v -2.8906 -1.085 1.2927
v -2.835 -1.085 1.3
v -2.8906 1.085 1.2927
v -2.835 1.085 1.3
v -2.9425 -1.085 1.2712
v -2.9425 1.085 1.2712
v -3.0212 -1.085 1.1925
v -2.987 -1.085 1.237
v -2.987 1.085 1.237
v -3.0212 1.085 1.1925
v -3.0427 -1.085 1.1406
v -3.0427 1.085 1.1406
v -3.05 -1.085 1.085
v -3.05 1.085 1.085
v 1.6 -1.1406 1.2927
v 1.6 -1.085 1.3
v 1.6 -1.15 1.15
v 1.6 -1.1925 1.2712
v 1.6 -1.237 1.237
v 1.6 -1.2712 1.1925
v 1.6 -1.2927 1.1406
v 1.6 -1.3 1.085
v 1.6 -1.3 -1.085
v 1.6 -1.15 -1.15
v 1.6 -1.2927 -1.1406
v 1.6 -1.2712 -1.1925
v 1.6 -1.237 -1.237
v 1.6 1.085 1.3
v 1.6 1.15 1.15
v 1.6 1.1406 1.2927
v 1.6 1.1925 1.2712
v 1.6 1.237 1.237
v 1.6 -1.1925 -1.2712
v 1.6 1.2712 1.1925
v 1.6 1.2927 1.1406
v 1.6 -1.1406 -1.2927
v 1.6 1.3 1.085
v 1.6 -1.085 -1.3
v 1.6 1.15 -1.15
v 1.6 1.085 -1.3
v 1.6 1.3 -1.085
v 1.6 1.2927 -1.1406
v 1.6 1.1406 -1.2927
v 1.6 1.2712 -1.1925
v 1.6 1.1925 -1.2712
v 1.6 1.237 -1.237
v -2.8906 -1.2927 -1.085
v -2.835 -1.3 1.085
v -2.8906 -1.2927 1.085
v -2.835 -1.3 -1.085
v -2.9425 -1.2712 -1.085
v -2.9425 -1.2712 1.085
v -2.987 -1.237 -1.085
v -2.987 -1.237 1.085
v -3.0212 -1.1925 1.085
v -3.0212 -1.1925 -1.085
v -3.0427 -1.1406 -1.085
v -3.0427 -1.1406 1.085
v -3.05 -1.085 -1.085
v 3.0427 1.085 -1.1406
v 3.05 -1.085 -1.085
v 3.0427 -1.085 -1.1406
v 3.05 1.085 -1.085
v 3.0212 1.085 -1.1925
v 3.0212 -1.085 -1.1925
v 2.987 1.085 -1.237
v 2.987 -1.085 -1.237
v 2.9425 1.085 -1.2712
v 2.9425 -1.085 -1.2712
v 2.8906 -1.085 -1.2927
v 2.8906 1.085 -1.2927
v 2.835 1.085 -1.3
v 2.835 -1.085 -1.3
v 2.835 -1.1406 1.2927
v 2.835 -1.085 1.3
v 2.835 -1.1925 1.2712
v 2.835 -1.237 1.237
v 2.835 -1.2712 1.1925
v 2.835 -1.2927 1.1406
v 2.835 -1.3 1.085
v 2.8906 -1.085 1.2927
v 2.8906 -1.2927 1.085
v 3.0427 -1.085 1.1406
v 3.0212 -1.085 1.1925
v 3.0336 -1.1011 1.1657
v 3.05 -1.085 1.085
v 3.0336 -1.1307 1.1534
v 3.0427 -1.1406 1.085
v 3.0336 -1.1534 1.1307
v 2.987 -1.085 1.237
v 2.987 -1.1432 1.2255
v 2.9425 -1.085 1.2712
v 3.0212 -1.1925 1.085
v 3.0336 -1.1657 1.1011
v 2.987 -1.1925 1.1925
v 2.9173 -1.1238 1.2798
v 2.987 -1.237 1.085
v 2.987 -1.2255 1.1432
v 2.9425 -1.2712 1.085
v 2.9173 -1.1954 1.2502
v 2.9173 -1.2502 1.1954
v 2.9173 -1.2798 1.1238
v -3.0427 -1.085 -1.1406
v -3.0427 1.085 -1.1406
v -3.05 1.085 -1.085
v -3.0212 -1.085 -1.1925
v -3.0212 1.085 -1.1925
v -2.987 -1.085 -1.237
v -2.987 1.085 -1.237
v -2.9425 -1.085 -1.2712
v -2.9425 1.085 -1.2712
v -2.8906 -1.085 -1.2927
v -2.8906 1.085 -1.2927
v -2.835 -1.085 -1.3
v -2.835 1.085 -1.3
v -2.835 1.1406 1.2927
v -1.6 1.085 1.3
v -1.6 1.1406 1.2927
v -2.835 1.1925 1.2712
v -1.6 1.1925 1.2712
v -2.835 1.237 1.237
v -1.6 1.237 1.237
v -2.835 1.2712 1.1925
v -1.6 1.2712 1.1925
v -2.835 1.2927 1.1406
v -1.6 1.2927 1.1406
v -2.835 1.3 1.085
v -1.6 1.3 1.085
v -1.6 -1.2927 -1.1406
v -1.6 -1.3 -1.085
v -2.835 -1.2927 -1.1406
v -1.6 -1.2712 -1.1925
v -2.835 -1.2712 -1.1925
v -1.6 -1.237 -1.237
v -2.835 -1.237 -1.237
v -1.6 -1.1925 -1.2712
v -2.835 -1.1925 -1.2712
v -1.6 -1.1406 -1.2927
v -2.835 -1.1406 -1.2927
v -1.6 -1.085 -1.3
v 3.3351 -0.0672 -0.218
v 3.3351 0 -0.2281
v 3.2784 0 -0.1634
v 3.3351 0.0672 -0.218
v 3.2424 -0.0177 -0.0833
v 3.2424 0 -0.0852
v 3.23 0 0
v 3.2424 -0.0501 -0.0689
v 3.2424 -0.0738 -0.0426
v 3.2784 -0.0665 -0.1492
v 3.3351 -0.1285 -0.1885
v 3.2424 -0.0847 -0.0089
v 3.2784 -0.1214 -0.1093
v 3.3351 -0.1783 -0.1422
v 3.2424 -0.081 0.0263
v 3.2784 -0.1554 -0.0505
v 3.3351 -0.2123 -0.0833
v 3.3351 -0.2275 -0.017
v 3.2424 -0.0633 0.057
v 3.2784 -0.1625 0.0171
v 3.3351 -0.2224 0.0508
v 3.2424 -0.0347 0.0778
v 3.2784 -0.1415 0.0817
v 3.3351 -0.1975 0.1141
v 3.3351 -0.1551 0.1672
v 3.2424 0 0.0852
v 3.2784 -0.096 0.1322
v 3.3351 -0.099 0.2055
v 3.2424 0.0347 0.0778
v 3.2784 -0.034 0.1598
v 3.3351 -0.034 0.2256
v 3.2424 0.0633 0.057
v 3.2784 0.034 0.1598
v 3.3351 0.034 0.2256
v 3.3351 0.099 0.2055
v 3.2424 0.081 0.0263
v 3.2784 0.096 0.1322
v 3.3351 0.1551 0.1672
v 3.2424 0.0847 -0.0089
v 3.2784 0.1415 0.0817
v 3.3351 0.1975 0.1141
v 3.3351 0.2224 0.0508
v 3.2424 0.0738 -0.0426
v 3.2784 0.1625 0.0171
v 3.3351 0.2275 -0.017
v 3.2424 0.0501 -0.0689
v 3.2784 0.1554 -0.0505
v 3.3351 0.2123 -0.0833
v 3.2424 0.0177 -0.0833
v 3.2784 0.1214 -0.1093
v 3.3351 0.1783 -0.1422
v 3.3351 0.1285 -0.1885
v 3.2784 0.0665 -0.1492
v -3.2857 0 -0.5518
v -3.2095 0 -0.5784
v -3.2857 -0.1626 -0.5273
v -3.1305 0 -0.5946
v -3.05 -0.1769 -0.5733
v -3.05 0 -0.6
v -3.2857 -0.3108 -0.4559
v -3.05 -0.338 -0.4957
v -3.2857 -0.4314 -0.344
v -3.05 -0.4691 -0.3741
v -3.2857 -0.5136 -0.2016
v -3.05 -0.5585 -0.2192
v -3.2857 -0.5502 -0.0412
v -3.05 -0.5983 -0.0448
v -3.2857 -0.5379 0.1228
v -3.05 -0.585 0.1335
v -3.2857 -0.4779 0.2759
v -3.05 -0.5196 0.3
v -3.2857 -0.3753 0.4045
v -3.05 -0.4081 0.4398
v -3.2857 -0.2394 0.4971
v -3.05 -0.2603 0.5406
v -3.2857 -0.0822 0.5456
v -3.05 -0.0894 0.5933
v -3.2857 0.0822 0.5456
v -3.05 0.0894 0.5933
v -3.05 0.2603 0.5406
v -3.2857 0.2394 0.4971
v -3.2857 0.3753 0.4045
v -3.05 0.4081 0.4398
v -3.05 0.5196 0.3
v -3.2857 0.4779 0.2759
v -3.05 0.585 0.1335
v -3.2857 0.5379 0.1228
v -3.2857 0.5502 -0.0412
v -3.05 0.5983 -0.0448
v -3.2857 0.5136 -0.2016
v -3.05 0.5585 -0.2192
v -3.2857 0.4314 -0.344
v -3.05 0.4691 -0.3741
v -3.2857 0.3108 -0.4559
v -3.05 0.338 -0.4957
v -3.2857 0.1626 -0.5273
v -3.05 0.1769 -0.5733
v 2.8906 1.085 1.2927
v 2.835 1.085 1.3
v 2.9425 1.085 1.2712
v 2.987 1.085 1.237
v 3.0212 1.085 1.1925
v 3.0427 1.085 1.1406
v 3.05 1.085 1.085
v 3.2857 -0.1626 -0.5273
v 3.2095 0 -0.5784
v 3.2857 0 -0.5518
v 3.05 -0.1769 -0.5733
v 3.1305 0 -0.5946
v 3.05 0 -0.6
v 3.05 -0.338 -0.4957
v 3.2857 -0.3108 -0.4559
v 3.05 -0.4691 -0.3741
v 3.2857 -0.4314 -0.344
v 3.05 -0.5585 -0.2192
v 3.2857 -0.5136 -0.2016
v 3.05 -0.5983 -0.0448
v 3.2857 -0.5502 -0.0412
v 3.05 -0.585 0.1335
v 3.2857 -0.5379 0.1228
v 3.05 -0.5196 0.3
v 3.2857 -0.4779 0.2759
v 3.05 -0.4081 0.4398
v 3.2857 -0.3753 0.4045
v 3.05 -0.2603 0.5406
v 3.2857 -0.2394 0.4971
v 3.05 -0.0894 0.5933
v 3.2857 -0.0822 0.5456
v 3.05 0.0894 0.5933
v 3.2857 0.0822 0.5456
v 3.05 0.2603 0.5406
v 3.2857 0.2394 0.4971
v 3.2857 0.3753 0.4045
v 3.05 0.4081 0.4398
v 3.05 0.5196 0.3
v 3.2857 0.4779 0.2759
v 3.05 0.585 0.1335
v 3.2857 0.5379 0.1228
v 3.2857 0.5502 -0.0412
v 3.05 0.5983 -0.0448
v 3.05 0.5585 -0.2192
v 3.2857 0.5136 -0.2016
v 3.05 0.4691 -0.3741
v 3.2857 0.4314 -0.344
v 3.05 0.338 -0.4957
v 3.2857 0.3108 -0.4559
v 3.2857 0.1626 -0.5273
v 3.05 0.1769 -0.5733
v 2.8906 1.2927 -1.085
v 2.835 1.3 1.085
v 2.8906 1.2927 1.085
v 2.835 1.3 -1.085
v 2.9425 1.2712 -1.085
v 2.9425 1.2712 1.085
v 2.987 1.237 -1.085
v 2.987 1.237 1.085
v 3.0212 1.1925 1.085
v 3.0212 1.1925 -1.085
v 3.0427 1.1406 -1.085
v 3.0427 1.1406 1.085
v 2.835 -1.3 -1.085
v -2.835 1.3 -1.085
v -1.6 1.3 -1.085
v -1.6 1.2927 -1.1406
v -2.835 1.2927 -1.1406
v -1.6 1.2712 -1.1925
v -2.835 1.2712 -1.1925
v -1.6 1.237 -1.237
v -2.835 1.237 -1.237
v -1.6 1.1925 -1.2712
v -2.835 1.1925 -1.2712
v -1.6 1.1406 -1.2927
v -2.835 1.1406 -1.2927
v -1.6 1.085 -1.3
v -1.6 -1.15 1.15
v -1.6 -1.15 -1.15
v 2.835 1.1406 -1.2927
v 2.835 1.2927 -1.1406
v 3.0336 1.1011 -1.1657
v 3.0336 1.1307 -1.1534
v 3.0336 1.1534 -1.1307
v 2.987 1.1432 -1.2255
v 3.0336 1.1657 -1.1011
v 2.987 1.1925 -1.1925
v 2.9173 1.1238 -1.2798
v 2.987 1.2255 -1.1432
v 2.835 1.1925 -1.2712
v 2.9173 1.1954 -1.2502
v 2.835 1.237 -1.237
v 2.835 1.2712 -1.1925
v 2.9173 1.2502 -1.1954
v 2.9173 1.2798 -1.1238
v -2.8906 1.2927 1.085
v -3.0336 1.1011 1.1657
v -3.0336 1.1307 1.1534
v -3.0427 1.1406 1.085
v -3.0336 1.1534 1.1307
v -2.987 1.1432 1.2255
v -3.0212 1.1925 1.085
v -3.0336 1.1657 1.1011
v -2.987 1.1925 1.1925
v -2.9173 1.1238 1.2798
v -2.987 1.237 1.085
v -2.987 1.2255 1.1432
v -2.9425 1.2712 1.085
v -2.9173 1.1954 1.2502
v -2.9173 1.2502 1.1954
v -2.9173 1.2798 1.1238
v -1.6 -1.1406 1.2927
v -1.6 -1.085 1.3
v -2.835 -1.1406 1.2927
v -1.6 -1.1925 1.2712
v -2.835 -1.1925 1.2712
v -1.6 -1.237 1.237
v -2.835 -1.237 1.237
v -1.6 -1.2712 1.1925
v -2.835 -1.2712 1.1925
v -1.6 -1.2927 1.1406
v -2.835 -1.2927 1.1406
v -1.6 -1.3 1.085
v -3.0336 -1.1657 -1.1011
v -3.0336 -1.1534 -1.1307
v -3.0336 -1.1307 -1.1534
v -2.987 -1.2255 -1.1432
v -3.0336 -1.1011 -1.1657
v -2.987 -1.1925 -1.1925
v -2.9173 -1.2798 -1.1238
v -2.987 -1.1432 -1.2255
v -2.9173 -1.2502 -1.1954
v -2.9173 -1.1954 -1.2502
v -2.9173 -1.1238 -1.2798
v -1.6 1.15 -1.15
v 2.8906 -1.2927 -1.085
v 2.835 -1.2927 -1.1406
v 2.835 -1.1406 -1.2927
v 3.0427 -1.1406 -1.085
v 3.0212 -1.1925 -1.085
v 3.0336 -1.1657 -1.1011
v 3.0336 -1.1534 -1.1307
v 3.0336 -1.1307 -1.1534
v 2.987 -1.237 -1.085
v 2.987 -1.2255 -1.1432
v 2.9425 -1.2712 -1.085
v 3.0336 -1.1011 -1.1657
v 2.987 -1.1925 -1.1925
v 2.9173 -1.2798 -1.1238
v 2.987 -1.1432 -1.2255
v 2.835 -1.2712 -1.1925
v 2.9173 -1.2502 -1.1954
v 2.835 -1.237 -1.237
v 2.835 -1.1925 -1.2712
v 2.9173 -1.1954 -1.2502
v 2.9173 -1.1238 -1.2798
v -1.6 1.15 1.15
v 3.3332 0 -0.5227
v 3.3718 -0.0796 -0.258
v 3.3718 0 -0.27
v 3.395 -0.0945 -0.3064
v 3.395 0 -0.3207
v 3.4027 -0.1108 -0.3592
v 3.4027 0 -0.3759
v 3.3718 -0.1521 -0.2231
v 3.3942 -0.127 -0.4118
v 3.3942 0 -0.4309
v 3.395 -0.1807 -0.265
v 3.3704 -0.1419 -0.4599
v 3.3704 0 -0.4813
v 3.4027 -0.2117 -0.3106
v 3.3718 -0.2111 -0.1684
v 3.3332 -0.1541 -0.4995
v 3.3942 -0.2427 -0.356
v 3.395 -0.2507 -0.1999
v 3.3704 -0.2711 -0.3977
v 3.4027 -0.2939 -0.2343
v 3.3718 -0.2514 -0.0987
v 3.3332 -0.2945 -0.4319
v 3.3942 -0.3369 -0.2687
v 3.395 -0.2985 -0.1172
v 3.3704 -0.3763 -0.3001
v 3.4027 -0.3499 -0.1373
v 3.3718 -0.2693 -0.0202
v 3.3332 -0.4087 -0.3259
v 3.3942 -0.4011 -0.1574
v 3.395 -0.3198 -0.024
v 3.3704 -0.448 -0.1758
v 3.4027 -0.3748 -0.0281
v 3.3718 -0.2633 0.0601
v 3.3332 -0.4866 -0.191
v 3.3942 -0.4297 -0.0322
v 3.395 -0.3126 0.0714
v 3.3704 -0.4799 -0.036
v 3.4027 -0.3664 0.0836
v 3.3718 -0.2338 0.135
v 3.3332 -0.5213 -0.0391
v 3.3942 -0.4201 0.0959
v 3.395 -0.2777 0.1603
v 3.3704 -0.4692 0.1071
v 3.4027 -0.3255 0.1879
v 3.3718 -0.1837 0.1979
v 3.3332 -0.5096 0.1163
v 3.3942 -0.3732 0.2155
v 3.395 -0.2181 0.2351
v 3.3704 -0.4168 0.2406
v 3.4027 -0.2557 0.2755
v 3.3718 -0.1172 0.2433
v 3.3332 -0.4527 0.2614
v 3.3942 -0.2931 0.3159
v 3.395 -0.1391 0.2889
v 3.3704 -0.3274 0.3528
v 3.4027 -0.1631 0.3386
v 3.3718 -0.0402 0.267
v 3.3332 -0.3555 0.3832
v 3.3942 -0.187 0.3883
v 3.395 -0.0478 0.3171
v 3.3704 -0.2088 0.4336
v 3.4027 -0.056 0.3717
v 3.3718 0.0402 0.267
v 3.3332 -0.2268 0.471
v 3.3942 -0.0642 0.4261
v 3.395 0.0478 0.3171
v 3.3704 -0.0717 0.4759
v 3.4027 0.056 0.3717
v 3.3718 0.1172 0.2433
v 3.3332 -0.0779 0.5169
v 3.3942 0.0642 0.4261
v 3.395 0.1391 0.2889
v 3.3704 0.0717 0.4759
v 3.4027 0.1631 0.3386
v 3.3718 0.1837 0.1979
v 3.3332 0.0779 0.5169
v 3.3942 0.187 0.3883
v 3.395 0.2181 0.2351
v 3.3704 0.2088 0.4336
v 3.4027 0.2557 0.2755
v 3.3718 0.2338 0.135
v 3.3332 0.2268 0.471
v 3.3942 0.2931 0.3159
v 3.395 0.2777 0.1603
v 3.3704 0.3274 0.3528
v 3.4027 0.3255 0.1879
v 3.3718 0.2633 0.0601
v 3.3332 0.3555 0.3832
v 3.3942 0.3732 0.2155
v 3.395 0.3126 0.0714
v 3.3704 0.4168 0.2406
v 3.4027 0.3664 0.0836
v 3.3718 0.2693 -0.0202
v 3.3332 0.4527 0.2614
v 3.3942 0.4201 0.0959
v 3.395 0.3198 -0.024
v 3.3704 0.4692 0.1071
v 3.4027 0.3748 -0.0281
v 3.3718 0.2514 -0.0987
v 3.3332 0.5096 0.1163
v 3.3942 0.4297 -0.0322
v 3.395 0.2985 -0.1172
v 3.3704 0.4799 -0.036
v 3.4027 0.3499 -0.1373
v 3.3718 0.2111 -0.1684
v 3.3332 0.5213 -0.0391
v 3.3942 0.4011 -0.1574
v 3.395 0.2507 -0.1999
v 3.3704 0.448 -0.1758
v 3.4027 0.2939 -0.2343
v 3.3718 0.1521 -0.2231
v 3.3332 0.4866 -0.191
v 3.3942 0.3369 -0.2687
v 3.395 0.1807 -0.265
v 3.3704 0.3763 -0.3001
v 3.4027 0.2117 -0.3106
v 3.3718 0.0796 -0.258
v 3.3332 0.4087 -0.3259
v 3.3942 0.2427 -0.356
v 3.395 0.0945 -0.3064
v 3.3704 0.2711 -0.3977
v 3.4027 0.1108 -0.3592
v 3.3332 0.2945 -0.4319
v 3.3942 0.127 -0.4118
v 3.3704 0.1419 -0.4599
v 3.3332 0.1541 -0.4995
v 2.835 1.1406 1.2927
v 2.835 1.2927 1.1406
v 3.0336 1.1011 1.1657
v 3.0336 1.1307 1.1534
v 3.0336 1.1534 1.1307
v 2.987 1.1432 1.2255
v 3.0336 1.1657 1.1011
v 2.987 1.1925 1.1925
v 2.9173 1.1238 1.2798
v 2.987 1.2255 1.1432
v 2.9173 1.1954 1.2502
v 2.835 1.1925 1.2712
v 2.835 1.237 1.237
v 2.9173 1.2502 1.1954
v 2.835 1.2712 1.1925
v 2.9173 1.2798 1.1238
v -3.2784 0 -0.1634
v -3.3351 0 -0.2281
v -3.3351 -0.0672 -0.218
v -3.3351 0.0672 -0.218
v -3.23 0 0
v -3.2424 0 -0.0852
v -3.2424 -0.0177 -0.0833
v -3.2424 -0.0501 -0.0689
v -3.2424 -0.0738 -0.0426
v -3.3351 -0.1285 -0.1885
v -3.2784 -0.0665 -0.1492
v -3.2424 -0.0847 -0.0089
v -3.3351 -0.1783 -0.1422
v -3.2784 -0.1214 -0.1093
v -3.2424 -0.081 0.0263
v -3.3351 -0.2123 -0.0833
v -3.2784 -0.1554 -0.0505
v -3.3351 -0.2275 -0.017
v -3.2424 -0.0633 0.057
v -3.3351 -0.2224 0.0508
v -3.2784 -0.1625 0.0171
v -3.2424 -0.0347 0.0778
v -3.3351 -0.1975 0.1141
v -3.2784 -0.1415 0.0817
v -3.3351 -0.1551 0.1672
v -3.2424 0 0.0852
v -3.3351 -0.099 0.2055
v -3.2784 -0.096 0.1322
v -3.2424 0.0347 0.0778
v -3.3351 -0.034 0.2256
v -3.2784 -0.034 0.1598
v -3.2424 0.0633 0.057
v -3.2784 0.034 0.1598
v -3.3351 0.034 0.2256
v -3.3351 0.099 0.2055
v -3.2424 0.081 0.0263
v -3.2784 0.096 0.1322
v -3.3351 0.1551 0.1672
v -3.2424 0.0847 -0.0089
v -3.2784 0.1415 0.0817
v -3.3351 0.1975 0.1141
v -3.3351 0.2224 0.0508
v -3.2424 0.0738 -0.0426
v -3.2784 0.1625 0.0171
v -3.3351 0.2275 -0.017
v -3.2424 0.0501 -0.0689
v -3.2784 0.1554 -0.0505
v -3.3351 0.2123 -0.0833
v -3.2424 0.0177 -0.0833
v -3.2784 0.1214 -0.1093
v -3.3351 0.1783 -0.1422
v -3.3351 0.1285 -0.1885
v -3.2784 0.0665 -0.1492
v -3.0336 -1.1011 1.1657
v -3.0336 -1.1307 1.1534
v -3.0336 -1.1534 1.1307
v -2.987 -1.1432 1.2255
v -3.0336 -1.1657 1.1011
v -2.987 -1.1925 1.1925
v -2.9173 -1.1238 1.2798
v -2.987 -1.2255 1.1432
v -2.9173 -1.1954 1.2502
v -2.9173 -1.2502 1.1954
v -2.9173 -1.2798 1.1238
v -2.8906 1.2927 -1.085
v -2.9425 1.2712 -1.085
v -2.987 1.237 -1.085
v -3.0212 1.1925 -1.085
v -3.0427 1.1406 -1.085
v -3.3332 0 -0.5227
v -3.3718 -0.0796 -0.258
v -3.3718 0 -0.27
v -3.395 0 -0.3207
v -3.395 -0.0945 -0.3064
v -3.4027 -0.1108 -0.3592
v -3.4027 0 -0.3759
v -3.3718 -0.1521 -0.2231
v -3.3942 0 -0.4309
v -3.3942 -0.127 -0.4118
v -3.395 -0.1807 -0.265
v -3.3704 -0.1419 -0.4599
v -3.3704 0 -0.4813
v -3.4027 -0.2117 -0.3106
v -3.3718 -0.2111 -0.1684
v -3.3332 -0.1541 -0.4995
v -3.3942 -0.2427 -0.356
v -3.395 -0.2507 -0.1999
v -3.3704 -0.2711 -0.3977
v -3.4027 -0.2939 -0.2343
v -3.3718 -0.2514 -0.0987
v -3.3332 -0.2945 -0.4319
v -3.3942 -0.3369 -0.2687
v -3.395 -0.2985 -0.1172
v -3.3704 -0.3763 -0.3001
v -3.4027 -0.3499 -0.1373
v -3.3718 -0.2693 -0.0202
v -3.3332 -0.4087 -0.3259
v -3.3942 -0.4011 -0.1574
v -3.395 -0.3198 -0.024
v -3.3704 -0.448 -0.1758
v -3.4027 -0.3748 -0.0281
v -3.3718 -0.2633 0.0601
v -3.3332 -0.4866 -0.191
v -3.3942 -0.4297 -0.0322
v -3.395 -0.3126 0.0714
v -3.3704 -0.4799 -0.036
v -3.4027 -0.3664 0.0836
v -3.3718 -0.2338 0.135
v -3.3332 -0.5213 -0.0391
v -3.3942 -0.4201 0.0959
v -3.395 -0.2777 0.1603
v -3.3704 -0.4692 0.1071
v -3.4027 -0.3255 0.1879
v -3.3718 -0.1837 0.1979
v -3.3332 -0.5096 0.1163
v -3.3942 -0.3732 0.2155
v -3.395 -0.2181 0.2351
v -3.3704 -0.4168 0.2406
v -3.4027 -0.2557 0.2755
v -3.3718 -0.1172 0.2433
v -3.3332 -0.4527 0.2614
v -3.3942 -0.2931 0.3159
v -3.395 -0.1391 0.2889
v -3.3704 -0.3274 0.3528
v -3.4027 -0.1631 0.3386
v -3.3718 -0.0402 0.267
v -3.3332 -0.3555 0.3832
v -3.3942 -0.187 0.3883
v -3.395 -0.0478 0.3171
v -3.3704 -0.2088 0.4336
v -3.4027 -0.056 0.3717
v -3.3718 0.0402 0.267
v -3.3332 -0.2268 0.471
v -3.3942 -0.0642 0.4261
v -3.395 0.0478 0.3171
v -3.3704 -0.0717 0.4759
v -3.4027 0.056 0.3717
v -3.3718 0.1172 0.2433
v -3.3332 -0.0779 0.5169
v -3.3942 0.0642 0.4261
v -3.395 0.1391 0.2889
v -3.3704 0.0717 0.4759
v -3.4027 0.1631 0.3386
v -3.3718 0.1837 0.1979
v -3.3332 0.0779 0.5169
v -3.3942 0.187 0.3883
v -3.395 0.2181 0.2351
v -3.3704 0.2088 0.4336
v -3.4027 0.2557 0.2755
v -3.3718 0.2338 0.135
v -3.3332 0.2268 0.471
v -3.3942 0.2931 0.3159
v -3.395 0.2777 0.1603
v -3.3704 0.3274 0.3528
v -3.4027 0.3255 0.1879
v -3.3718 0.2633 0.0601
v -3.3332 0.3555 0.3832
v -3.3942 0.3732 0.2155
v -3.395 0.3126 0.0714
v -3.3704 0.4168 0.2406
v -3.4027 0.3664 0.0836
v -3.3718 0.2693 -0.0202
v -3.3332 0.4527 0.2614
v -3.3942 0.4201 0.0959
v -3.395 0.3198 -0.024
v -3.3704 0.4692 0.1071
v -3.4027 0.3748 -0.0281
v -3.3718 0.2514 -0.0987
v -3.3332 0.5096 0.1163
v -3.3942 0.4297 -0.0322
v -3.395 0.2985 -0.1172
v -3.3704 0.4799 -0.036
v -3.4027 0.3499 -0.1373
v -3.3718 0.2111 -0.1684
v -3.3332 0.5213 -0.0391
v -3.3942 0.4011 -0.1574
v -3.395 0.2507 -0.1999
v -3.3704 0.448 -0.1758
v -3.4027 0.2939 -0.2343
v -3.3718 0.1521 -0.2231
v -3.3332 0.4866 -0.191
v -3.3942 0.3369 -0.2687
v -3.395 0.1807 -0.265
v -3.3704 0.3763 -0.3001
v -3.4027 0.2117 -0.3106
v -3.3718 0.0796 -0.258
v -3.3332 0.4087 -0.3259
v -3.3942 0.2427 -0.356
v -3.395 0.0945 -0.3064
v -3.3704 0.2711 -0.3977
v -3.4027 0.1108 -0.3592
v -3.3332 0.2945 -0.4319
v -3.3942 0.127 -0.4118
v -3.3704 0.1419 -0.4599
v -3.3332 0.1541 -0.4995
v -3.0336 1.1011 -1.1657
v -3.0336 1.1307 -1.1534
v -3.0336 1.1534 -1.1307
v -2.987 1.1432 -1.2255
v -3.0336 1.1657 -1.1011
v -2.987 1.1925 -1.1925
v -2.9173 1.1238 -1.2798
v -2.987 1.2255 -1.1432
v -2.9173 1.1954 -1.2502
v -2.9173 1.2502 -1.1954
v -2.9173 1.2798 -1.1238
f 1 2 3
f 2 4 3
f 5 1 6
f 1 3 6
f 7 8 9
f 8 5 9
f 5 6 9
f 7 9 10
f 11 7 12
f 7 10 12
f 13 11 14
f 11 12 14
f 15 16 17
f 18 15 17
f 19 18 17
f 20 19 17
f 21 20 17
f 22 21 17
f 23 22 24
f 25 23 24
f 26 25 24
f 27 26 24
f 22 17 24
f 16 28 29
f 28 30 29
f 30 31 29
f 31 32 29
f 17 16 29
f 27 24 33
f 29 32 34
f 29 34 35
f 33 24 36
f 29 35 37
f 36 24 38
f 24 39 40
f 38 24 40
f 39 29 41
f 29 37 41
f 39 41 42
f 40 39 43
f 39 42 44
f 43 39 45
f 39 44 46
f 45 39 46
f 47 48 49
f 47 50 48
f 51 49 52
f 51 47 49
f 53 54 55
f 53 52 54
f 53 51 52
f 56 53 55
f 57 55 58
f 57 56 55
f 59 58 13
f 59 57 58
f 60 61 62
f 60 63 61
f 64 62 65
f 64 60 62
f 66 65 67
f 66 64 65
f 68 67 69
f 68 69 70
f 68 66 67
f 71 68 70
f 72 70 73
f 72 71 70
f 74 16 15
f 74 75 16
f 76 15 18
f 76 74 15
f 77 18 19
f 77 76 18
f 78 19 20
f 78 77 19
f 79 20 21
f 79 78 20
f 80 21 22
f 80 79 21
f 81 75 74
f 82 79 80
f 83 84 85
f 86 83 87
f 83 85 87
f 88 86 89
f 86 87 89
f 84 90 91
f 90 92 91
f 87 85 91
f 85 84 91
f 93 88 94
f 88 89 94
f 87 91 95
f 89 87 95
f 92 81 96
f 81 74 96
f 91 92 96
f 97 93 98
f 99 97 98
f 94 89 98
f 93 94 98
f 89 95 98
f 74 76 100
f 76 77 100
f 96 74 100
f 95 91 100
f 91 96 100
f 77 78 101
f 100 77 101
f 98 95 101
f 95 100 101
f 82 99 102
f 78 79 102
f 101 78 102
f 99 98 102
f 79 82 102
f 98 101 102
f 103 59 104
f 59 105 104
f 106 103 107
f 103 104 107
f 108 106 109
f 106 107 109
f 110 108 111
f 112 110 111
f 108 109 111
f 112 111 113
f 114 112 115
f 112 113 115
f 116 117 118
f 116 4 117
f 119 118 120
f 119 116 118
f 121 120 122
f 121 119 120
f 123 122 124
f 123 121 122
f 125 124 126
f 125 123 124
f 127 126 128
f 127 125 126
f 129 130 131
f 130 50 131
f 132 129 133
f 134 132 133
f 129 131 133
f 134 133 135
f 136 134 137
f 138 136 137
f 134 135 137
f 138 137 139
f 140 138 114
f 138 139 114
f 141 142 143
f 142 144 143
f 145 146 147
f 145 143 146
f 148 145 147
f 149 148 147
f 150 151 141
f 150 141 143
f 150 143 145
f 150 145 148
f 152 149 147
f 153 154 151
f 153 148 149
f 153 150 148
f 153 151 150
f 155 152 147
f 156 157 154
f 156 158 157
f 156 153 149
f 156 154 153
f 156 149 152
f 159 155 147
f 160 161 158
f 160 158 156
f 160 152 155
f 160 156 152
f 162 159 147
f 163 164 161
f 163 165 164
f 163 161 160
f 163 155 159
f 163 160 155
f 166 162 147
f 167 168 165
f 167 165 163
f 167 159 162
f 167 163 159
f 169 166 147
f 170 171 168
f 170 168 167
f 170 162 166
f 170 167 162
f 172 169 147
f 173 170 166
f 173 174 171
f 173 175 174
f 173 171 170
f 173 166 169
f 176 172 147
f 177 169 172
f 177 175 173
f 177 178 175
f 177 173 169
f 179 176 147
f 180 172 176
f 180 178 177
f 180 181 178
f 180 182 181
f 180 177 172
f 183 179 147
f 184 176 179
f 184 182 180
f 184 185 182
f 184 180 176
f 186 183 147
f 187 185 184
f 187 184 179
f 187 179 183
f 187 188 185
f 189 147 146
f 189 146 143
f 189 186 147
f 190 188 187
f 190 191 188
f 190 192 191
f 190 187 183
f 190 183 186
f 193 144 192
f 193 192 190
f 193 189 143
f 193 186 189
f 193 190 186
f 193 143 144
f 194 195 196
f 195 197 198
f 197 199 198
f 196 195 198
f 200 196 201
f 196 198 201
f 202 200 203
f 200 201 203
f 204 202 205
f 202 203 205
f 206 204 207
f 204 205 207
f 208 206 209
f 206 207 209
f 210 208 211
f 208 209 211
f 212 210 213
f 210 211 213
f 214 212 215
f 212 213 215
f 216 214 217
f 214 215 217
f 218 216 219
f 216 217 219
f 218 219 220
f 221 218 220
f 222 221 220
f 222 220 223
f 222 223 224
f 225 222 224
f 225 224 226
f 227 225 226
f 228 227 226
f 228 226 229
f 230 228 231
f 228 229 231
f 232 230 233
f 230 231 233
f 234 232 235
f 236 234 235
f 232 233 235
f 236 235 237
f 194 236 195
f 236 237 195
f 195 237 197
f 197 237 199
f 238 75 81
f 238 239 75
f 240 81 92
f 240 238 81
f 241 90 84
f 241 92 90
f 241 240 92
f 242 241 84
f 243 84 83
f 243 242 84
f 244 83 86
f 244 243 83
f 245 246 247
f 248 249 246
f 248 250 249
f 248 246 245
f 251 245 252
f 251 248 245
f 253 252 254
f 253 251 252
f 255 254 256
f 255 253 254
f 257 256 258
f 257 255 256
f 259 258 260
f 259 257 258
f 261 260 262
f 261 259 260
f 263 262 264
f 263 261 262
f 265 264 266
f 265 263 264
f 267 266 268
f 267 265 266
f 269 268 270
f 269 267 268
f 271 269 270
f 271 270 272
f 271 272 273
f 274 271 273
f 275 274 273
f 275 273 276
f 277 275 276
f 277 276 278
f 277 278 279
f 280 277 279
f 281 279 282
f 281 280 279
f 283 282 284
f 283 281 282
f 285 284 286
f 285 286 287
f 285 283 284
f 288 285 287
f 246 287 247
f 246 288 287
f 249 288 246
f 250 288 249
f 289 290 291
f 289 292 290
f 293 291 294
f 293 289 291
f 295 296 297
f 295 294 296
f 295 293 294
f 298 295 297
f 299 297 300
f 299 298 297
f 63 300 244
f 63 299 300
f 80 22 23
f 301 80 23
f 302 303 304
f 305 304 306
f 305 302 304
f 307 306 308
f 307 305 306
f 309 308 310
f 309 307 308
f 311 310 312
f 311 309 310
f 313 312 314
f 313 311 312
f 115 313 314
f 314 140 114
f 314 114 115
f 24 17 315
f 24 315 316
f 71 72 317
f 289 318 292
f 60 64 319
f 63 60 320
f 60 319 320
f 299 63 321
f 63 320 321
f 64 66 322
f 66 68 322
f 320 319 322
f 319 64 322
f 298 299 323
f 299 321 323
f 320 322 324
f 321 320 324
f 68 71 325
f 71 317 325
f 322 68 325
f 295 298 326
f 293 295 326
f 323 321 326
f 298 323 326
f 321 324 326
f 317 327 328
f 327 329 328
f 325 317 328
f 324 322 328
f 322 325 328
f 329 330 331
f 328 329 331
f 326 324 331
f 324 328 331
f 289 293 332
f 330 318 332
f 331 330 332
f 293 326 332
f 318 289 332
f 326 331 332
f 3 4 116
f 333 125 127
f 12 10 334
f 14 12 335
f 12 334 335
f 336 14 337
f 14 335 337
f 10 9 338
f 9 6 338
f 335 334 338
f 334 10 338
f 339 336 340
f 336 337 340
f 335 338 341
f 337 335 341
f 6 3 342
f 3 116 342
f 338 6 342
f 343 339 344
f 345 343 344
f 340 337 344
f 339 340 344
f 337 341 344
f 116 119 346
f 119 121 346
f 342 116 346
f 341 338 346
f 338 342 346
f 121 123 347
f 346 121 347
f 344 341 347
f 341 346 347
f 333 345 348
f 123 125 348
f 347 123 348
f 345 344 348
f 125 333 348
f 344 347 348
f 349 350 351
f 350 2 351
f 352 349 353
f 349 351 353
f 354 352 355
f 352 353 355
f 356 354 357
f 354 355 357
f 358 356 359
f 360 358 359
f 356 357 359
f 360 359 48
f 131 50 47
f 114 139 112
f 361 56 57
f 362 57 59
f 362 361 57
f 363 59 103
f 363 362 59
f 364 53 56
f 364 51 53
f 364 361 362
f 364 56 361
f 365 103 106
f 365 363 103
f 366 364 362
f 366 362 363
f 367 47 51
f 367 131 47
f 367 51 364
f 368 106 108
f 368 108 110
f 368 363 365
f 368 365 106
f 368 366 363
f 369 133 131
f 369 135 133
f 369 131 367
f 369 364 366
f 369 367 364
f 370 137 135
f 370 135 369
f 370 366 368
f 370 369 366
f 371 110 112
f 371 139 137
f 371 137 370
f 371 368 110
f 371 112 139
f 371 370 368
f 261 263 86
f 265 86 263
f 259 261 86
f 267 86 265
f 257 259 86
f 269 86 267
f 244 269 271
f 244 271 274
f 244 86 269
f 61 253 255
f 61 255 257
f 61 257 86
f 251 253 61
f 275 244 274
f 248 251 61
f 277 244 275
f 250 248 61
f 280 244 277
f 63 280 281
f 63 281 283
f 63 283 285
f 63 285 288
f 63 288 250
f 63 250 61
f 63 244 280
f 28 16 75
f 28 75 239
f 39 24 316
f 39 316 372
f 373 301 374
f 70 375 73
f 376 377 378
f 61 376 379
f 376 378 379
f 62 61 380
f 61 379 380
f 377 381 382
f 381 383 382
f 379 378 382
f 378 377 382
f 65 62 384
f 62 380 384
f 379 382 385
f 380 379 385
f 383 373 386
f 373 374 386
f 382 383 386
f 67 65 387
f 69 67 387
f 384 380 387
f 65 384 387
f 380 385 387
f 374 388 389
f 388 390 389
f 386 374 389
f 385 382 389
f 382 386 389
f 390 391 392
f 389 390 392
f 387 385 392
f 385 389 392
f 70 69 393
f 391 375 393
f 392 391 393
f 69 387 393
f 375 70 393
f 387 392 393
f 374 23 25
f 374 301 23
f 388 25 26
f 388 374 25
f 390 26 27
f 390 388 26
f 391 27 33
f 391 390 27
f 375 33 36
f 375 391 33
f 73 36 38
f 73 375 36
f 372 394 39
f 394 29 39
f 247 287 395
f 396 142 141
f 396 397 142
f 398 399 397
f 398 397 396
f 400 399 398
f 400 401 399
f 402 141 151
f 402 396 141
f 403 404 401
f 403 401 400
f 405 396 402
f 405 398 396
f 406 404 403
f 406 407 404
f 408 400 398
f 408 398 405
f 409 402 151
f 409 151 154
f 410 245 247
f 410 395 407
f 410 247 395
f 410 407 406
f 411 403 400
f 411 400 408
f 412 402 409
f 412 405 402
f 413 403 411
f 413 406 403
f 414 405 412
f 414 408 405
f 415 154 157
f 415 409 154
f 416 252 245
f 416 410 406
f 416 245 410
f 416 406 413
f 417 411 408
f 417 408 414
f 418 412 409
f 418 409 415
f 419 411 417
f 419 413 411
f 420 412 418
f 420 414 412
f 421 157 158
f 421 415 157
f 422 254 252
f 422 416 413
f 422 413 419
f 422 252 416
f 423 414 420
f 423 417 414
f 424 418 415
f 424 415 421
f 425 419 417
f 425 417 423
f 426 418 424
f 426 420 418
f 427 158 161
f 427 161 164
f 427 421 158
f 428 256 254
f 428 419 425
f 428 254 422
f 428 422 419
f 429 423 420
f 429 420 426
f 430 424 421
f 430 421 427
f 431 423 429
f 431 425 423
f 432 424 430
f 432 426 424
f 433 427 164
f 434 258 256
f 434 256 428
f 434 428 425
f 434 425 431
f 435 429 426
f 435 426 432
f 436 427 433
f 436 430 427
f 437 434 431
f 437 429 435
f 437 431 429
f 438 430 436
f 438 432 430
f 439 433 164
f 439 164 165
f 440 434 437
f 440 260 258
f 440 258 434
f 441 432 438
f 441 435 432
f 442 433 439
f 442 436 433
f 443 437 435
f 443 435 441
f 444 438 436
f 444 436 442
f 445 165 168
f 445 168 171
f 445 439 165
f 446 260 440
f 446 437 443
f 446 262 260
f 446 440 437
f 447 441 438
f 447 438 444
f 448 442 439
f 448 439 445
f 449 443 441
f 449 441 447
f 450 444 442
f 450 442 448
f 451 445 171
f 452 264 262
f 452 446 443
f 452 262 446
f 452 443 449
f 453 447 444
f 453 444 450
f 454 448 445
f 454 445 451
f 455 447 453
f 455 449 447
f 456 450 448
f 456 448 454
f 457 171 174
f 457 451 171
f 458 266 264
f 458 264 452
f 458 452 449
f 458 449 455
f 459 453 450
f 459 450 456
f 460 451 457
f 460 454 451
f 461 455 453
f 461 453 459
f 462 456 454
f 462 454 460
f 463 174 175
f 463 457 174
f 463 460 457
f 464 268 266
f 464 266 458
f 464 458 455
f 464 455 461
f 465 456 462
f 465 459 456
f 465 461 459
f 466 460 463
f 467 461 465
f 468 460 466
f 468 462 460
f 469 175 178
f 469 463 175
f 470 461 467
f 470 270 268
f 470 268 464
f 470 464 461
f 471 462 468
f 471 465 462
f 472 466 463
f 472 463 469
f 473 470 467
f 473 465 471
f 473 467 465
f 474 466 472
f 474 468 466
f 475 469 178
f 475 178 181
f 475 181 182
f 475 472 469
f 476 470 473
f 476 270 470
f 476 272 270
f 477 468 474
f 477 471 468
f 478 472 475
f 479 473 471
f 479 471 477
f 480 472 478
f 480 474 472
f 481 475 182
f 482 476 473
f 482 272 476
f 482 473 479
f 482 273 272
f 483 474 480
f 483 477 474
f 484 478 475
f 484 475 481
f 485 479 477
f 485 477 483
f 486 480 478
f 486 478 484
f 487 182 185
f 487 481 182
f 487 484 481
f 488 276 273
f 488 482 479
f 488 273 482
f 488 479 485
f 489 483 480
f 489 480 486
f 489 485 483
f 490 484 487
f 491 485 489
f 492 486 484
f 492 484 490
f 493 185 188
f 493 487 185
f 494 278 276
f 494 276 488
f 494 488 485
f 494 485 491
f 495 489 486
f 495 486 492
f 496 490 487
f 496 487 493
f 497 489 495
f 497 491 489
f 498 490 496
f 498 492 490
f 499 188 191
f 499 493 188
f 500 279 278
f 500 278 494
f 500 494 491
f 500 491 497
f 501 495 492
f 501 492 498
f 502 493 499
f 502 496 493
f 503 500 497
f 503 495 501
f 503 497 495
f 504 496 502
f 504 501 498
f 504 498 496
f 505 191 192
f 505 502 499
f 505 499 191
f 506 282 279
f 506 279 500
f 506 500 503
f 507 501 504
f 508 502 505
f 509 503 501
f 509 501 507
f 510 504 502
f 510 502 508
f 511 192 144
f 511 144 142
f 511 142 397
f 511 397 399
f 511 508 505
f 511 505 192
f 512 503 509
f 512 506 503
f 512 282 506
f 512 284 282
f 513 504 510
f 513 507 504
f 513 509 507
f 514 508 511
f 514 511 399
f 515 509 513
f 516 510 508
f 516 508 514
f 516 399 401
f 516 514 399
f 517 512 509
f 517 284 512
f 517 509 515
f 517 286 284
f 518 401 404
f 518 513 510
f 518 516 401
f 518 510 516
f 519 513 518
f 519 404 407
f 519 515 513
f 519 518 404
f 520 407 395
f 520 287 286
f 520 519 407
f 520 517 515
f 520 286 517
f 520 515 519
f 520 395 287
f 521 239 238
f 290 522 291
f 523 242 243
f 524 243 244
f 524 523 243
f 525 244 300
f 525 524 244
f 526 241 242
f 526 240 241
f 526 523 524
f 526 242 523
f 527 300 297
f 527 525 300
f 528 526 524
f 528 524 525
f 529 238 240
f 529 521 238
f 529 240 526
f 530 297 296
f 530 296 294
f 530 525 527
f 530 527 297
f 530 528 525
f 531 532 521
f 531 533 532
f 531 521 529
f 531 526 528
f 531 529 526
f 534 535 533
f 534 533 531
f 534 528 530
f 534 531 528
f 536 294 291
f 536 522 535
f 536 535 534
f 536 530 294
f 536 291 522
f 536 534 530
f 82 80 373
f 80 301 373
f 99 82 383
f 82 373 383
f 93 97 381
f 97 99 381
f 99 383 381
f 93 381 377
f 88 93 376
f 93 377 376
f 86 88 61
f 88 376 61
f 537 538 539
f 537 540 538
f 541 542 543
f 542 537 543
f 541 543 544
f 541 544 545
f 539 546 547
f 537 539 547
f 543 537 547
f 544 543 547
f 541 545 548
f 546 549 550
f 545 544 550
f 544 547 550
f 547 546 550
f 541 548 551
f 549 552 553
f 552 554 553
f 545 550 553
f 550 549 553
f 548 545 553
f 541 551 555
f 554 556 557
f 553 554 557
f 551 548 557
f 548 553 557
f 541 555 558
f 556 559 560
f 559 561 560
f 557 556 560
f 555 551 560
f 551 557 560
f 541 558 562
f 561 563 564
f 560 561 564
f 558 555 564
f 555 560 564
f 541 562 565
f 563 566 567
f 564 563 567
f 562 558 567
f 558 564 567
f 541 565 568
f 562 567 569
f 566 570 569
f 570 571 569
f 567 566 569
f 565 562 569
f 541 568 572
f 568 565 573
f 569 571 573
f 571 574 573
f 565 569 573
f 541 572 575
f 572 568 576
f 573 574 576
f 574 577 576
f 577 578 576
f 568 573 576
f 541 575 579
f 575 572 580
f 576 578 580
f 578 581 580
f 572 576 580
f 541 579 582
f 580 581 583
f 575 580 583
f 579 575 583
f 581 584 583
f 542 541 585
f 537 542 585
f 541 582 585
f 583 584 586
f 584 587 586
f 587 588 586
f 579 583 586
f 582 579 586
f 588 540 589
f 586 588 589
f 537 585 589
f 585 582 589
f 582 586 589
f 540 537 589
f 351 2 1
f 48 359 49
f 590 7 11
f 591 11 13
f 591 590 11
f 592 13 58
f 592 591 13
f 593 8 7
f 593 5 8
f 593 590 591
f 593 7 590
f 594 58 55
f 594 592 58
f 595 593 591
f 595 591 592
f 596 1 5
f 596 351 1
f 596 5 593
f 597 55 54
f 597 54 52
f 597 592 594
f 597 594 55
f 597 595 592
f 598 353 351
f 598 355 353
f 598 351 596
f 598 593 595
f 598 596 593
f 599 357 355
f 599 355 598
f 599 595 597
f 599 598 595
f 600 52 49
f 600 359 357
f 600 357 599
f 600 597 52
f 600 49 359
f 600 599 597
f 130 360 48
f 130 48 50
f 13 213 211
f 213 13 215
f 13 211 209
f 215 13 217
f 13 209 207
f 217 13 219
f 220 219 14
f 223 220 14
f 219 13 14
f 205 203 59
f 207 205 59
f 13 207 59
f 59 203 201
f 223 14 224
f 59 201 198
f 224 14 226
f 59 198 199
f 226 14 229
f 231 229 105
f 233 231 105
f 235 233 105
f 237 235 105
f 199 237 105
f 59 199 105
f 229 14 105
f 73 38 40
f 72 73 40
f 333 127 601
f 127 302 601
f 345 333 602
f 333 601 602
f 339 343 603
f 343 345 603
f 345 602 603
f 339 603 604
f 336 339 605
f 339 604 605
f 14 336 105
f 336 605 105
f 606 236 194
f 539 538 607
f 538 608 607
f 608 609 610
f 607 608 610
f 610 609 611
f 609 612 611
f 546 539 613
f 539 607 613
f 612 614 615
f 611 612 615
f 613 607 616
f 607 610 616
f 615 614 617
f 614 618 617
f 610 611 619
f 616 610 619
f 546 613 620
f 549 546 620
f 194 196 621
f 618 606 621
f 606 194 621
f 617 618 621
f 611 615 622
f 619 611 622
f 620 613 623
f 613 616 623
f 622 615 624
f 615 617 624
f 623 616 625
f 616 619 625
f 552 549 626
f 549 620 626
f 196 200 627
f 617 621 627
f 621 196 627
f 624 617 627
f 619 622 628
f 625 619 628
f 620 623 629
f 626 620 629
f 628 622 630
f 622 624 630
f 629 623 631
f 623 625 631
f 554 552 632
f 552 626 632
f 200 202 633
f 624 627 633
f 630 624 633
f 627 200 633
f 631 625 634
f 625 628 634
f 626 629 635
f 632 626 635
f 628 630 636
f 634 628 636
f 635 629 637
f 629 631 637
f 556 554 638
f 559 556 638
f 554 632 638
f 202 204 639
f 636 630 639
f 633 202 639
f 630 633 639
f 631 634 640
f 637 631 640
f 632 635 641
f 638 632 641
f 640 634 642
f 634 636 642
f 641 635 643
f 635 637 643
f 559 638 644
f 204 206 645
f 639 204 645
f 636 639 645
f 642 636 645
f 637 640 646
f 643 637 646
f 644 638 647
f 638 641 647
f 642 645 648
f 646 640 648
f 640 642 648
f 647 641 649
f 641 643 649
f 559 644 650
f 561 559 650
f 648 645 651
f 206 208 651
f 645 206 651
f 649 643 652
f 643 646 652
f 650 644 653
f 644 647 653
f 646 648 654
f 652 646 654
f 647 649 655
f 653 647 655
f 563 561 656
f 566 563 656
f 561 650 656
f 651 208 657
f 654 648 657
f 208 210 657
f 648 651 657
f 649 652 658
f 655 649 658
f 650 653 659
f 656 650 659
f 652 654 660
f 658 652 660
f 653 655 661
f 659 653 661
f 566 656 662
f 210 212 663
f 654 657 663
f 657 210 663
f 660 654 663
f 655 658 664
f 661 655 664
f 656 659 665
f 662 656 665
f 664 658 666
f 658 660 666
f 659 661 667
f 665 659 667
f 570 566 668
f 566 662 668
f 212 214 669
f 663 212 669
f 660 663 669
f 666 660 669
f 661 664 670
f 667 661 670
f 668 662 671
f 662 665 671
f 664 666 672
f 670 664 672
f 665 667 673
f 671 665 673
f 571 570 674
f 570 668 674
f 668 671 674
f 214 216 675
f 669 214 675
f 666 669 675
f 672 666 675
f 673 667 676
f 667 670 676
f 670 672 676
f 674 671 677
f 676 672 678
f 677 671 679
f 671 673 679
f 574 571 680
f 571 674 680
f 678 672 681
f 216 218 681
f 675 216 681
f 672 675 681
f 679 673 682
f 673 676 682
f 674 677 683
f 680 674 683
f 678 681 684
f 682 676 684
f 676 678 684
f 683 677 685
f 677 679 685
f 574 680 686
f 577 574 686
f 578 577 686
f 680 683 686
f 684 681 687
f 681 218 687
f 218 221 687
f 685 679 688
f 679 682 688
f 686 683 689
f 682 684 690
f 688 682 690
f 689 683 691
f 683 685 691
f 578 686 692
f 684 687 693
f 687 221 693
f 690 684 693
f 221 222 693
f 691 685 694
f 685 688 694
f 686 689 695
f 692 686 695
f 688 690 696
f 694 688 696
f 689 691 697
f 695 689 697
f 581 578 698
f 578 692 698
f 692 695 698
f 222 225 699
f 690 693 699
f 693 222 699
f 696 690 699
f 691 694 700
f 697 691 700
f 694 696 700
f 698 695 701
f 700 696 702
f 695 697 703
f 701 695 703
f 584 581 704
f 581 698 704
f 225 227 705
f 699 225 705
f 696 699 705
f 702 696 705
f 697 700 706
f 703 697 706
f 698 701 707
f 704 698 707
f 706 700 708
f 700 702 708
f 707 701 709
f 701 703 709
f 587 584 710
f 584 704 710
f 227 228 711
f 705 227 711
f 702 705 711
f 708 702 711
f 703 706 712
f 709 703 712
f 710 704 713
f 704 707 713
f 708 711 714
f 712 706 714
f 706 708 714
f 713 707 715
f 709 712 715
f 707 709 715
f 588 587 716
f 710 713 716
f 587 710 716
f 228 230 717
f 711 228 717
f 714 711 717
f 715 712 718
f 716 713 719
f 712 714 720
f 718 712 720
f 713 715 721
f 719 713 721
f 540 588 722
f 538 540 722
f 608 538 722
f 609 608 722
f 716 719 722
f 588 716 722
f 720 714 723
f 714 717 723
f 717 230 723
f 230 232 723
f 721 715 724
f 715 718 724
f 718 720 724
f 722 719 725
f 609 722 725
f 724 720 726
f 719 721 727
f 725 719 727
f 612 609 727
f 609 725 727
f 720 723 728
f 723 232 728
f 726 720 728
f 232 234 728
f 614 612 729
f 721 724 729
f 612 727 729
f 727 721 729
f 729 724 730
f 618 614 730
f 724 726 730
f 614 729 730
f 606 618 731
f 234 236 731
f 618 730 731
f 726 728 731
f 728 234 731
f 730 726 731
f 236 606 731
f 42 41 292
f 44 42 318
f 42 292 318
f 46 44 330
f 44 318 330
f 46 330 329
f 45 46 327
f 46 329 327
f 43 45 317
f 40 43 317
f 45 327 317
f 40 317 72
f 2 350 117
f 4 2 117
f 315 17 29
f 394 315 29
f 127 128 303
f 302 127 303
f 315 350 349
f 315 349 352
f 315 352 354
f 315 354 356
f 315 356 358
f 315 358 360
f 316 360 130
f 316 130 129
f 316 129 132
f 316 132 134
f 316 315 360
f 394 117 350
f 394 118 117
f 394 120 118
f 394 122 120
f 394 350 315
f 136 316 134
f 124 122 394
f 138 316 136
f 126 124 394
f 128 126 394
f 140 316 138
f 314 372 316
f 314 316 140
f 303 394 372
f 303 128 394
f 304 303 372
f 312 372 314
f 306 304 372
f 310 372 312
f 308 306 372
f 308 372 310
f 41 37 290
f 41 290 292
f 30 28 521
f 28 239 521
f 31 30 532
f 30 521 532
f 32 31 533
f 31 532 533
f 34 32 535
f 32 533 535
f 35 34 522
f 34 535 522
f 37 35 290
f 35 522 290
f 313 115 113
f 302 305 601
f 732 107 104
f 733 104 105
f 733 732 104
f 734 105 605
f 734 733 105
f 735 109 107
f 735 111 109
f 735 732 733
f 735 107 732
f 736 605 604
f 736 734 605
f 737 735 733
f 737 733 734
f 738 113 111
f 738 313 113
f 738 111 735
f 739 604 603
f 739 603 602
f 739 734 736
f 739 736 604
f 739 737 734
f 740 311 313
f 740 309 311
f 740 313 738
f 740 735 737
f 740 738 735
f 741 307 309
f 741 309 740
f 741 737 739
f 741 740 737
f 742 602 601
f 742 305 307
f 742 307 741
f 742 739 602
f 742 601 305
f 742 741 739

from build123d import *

# Parameters (mm, degrees)
SKETCH1_W            = 2.3
SKETCH1_H            = 2.3
BOSS_EXTRUDE1_DEPTH  = 1.6
SKETCH4_W            = 2.6
SKETCH4_H            = 2.6
BOSS_EXTRUDE2_DEPTH  = 1.45
FILLET1_R            = 0.215
FILLET1_OF_MIRROR2_R = 0.215


with BuildPart() as part:
    # Sketch1 → Boss-Extrude1 (new body, symmetric)
    with BuildSketch(Plane(origin=(0, 0, 0), x_dir=(0, 0, -1), z_dir=(1, 0, 0))):
        Rectangle(SKETCH1_W, SKETCH1_H)
    extrude(amount=BOSS_EXTRUDE1_DEPTH, both=True)

    # Sketch4 → Boss-Extrude2 (add)
    with BuildSketch(Plane(origin=(1.6, 0, 0), x_dir=(0, 0, -1), z_dir=(1, 0, 0))):
        Rectangle(SKETCH4_W, SKETCH4_H)
    boss_extrude2 = extrude(amount=BOSS_EXTRUDE2_DEPTH)

    # Sketch5 → Revolve4 (revolve)
    with BuildSketch(Plane(origin=(0, 0, 0), x_dir=(1, 0, 0), z_dir=(0, 1, 0))):
        with BuildLine():
            Line((3.05, 0.6), (3.05, 0))
            Line((3.05, 0), (3.23, 0))
            ThreePointArc((3.23, 0), (3.257550578, 0.125583887), (3.335142084, 0.228101715))
            ThreePointArc((3.335142084, 0.228101715), (3.40045563, 0.403698644), (3.285679214, 0.551774689))
            ThreePointArc((3.285679214, 0.551774689), (3.170281308, 0.587820046), (3.05, 0.6))
        make_face()
    revolve4 = revolve(axis=Axis((3.53, 0, 0), (-1, 0, 0)))

    # Fillet1
    fillet1_edges = [part.edges().sort_by_distance(p)[0] for p in [
        (2.325, 1.3, 1.3),
        (2.325, -1.3, 1.3),
        (2.325, -1.3, -1.3),
        (2.325, 1.3, -1.3),
        (3.05, 0, 1.3),
        (3.05, -1.3, 0),
        (3.05, 0, -1.3),
        (3.05, 1.3, 0),
    ]]
    fillet(fillet1_edges, radius=FILLET1_R)

    # Mirror2: Boss-Extrude2, Revolve4 across plane
    add(boss_extrude2.mirror(Plane(origin=(0, 0, 0), x_dir=(0, 0, 1), z_dir=(1, 0, 0))))
    add(revolve4.mirror(Plane(origin=(0, 0, 0), x_dir=(0, 0, 1), z_dir=(1, 0, 0))))

    # Fillet1 of Mirror2
    fillet1_of_mirror2_edges = [part.edges().sort_by_distance(p)[0] for p in [
        (-2.325, 1.3, 1.3),
        (-2.325, -1.3, 1.3),
        (-2.325, -1.3, -1.3),
        (-2.325, 1.3, -1.3),
        (-3.05, 0, 1.3),
        (-3.05, -1.3, 0),
        (-3.05, 0, -1.3),
        (-3.05, 1.3, 0),
    ]]
    fillet(fillet1_of_mirror2_edges, radius=FILLET1_OF_MIRROR2_R)


solid = part.part
